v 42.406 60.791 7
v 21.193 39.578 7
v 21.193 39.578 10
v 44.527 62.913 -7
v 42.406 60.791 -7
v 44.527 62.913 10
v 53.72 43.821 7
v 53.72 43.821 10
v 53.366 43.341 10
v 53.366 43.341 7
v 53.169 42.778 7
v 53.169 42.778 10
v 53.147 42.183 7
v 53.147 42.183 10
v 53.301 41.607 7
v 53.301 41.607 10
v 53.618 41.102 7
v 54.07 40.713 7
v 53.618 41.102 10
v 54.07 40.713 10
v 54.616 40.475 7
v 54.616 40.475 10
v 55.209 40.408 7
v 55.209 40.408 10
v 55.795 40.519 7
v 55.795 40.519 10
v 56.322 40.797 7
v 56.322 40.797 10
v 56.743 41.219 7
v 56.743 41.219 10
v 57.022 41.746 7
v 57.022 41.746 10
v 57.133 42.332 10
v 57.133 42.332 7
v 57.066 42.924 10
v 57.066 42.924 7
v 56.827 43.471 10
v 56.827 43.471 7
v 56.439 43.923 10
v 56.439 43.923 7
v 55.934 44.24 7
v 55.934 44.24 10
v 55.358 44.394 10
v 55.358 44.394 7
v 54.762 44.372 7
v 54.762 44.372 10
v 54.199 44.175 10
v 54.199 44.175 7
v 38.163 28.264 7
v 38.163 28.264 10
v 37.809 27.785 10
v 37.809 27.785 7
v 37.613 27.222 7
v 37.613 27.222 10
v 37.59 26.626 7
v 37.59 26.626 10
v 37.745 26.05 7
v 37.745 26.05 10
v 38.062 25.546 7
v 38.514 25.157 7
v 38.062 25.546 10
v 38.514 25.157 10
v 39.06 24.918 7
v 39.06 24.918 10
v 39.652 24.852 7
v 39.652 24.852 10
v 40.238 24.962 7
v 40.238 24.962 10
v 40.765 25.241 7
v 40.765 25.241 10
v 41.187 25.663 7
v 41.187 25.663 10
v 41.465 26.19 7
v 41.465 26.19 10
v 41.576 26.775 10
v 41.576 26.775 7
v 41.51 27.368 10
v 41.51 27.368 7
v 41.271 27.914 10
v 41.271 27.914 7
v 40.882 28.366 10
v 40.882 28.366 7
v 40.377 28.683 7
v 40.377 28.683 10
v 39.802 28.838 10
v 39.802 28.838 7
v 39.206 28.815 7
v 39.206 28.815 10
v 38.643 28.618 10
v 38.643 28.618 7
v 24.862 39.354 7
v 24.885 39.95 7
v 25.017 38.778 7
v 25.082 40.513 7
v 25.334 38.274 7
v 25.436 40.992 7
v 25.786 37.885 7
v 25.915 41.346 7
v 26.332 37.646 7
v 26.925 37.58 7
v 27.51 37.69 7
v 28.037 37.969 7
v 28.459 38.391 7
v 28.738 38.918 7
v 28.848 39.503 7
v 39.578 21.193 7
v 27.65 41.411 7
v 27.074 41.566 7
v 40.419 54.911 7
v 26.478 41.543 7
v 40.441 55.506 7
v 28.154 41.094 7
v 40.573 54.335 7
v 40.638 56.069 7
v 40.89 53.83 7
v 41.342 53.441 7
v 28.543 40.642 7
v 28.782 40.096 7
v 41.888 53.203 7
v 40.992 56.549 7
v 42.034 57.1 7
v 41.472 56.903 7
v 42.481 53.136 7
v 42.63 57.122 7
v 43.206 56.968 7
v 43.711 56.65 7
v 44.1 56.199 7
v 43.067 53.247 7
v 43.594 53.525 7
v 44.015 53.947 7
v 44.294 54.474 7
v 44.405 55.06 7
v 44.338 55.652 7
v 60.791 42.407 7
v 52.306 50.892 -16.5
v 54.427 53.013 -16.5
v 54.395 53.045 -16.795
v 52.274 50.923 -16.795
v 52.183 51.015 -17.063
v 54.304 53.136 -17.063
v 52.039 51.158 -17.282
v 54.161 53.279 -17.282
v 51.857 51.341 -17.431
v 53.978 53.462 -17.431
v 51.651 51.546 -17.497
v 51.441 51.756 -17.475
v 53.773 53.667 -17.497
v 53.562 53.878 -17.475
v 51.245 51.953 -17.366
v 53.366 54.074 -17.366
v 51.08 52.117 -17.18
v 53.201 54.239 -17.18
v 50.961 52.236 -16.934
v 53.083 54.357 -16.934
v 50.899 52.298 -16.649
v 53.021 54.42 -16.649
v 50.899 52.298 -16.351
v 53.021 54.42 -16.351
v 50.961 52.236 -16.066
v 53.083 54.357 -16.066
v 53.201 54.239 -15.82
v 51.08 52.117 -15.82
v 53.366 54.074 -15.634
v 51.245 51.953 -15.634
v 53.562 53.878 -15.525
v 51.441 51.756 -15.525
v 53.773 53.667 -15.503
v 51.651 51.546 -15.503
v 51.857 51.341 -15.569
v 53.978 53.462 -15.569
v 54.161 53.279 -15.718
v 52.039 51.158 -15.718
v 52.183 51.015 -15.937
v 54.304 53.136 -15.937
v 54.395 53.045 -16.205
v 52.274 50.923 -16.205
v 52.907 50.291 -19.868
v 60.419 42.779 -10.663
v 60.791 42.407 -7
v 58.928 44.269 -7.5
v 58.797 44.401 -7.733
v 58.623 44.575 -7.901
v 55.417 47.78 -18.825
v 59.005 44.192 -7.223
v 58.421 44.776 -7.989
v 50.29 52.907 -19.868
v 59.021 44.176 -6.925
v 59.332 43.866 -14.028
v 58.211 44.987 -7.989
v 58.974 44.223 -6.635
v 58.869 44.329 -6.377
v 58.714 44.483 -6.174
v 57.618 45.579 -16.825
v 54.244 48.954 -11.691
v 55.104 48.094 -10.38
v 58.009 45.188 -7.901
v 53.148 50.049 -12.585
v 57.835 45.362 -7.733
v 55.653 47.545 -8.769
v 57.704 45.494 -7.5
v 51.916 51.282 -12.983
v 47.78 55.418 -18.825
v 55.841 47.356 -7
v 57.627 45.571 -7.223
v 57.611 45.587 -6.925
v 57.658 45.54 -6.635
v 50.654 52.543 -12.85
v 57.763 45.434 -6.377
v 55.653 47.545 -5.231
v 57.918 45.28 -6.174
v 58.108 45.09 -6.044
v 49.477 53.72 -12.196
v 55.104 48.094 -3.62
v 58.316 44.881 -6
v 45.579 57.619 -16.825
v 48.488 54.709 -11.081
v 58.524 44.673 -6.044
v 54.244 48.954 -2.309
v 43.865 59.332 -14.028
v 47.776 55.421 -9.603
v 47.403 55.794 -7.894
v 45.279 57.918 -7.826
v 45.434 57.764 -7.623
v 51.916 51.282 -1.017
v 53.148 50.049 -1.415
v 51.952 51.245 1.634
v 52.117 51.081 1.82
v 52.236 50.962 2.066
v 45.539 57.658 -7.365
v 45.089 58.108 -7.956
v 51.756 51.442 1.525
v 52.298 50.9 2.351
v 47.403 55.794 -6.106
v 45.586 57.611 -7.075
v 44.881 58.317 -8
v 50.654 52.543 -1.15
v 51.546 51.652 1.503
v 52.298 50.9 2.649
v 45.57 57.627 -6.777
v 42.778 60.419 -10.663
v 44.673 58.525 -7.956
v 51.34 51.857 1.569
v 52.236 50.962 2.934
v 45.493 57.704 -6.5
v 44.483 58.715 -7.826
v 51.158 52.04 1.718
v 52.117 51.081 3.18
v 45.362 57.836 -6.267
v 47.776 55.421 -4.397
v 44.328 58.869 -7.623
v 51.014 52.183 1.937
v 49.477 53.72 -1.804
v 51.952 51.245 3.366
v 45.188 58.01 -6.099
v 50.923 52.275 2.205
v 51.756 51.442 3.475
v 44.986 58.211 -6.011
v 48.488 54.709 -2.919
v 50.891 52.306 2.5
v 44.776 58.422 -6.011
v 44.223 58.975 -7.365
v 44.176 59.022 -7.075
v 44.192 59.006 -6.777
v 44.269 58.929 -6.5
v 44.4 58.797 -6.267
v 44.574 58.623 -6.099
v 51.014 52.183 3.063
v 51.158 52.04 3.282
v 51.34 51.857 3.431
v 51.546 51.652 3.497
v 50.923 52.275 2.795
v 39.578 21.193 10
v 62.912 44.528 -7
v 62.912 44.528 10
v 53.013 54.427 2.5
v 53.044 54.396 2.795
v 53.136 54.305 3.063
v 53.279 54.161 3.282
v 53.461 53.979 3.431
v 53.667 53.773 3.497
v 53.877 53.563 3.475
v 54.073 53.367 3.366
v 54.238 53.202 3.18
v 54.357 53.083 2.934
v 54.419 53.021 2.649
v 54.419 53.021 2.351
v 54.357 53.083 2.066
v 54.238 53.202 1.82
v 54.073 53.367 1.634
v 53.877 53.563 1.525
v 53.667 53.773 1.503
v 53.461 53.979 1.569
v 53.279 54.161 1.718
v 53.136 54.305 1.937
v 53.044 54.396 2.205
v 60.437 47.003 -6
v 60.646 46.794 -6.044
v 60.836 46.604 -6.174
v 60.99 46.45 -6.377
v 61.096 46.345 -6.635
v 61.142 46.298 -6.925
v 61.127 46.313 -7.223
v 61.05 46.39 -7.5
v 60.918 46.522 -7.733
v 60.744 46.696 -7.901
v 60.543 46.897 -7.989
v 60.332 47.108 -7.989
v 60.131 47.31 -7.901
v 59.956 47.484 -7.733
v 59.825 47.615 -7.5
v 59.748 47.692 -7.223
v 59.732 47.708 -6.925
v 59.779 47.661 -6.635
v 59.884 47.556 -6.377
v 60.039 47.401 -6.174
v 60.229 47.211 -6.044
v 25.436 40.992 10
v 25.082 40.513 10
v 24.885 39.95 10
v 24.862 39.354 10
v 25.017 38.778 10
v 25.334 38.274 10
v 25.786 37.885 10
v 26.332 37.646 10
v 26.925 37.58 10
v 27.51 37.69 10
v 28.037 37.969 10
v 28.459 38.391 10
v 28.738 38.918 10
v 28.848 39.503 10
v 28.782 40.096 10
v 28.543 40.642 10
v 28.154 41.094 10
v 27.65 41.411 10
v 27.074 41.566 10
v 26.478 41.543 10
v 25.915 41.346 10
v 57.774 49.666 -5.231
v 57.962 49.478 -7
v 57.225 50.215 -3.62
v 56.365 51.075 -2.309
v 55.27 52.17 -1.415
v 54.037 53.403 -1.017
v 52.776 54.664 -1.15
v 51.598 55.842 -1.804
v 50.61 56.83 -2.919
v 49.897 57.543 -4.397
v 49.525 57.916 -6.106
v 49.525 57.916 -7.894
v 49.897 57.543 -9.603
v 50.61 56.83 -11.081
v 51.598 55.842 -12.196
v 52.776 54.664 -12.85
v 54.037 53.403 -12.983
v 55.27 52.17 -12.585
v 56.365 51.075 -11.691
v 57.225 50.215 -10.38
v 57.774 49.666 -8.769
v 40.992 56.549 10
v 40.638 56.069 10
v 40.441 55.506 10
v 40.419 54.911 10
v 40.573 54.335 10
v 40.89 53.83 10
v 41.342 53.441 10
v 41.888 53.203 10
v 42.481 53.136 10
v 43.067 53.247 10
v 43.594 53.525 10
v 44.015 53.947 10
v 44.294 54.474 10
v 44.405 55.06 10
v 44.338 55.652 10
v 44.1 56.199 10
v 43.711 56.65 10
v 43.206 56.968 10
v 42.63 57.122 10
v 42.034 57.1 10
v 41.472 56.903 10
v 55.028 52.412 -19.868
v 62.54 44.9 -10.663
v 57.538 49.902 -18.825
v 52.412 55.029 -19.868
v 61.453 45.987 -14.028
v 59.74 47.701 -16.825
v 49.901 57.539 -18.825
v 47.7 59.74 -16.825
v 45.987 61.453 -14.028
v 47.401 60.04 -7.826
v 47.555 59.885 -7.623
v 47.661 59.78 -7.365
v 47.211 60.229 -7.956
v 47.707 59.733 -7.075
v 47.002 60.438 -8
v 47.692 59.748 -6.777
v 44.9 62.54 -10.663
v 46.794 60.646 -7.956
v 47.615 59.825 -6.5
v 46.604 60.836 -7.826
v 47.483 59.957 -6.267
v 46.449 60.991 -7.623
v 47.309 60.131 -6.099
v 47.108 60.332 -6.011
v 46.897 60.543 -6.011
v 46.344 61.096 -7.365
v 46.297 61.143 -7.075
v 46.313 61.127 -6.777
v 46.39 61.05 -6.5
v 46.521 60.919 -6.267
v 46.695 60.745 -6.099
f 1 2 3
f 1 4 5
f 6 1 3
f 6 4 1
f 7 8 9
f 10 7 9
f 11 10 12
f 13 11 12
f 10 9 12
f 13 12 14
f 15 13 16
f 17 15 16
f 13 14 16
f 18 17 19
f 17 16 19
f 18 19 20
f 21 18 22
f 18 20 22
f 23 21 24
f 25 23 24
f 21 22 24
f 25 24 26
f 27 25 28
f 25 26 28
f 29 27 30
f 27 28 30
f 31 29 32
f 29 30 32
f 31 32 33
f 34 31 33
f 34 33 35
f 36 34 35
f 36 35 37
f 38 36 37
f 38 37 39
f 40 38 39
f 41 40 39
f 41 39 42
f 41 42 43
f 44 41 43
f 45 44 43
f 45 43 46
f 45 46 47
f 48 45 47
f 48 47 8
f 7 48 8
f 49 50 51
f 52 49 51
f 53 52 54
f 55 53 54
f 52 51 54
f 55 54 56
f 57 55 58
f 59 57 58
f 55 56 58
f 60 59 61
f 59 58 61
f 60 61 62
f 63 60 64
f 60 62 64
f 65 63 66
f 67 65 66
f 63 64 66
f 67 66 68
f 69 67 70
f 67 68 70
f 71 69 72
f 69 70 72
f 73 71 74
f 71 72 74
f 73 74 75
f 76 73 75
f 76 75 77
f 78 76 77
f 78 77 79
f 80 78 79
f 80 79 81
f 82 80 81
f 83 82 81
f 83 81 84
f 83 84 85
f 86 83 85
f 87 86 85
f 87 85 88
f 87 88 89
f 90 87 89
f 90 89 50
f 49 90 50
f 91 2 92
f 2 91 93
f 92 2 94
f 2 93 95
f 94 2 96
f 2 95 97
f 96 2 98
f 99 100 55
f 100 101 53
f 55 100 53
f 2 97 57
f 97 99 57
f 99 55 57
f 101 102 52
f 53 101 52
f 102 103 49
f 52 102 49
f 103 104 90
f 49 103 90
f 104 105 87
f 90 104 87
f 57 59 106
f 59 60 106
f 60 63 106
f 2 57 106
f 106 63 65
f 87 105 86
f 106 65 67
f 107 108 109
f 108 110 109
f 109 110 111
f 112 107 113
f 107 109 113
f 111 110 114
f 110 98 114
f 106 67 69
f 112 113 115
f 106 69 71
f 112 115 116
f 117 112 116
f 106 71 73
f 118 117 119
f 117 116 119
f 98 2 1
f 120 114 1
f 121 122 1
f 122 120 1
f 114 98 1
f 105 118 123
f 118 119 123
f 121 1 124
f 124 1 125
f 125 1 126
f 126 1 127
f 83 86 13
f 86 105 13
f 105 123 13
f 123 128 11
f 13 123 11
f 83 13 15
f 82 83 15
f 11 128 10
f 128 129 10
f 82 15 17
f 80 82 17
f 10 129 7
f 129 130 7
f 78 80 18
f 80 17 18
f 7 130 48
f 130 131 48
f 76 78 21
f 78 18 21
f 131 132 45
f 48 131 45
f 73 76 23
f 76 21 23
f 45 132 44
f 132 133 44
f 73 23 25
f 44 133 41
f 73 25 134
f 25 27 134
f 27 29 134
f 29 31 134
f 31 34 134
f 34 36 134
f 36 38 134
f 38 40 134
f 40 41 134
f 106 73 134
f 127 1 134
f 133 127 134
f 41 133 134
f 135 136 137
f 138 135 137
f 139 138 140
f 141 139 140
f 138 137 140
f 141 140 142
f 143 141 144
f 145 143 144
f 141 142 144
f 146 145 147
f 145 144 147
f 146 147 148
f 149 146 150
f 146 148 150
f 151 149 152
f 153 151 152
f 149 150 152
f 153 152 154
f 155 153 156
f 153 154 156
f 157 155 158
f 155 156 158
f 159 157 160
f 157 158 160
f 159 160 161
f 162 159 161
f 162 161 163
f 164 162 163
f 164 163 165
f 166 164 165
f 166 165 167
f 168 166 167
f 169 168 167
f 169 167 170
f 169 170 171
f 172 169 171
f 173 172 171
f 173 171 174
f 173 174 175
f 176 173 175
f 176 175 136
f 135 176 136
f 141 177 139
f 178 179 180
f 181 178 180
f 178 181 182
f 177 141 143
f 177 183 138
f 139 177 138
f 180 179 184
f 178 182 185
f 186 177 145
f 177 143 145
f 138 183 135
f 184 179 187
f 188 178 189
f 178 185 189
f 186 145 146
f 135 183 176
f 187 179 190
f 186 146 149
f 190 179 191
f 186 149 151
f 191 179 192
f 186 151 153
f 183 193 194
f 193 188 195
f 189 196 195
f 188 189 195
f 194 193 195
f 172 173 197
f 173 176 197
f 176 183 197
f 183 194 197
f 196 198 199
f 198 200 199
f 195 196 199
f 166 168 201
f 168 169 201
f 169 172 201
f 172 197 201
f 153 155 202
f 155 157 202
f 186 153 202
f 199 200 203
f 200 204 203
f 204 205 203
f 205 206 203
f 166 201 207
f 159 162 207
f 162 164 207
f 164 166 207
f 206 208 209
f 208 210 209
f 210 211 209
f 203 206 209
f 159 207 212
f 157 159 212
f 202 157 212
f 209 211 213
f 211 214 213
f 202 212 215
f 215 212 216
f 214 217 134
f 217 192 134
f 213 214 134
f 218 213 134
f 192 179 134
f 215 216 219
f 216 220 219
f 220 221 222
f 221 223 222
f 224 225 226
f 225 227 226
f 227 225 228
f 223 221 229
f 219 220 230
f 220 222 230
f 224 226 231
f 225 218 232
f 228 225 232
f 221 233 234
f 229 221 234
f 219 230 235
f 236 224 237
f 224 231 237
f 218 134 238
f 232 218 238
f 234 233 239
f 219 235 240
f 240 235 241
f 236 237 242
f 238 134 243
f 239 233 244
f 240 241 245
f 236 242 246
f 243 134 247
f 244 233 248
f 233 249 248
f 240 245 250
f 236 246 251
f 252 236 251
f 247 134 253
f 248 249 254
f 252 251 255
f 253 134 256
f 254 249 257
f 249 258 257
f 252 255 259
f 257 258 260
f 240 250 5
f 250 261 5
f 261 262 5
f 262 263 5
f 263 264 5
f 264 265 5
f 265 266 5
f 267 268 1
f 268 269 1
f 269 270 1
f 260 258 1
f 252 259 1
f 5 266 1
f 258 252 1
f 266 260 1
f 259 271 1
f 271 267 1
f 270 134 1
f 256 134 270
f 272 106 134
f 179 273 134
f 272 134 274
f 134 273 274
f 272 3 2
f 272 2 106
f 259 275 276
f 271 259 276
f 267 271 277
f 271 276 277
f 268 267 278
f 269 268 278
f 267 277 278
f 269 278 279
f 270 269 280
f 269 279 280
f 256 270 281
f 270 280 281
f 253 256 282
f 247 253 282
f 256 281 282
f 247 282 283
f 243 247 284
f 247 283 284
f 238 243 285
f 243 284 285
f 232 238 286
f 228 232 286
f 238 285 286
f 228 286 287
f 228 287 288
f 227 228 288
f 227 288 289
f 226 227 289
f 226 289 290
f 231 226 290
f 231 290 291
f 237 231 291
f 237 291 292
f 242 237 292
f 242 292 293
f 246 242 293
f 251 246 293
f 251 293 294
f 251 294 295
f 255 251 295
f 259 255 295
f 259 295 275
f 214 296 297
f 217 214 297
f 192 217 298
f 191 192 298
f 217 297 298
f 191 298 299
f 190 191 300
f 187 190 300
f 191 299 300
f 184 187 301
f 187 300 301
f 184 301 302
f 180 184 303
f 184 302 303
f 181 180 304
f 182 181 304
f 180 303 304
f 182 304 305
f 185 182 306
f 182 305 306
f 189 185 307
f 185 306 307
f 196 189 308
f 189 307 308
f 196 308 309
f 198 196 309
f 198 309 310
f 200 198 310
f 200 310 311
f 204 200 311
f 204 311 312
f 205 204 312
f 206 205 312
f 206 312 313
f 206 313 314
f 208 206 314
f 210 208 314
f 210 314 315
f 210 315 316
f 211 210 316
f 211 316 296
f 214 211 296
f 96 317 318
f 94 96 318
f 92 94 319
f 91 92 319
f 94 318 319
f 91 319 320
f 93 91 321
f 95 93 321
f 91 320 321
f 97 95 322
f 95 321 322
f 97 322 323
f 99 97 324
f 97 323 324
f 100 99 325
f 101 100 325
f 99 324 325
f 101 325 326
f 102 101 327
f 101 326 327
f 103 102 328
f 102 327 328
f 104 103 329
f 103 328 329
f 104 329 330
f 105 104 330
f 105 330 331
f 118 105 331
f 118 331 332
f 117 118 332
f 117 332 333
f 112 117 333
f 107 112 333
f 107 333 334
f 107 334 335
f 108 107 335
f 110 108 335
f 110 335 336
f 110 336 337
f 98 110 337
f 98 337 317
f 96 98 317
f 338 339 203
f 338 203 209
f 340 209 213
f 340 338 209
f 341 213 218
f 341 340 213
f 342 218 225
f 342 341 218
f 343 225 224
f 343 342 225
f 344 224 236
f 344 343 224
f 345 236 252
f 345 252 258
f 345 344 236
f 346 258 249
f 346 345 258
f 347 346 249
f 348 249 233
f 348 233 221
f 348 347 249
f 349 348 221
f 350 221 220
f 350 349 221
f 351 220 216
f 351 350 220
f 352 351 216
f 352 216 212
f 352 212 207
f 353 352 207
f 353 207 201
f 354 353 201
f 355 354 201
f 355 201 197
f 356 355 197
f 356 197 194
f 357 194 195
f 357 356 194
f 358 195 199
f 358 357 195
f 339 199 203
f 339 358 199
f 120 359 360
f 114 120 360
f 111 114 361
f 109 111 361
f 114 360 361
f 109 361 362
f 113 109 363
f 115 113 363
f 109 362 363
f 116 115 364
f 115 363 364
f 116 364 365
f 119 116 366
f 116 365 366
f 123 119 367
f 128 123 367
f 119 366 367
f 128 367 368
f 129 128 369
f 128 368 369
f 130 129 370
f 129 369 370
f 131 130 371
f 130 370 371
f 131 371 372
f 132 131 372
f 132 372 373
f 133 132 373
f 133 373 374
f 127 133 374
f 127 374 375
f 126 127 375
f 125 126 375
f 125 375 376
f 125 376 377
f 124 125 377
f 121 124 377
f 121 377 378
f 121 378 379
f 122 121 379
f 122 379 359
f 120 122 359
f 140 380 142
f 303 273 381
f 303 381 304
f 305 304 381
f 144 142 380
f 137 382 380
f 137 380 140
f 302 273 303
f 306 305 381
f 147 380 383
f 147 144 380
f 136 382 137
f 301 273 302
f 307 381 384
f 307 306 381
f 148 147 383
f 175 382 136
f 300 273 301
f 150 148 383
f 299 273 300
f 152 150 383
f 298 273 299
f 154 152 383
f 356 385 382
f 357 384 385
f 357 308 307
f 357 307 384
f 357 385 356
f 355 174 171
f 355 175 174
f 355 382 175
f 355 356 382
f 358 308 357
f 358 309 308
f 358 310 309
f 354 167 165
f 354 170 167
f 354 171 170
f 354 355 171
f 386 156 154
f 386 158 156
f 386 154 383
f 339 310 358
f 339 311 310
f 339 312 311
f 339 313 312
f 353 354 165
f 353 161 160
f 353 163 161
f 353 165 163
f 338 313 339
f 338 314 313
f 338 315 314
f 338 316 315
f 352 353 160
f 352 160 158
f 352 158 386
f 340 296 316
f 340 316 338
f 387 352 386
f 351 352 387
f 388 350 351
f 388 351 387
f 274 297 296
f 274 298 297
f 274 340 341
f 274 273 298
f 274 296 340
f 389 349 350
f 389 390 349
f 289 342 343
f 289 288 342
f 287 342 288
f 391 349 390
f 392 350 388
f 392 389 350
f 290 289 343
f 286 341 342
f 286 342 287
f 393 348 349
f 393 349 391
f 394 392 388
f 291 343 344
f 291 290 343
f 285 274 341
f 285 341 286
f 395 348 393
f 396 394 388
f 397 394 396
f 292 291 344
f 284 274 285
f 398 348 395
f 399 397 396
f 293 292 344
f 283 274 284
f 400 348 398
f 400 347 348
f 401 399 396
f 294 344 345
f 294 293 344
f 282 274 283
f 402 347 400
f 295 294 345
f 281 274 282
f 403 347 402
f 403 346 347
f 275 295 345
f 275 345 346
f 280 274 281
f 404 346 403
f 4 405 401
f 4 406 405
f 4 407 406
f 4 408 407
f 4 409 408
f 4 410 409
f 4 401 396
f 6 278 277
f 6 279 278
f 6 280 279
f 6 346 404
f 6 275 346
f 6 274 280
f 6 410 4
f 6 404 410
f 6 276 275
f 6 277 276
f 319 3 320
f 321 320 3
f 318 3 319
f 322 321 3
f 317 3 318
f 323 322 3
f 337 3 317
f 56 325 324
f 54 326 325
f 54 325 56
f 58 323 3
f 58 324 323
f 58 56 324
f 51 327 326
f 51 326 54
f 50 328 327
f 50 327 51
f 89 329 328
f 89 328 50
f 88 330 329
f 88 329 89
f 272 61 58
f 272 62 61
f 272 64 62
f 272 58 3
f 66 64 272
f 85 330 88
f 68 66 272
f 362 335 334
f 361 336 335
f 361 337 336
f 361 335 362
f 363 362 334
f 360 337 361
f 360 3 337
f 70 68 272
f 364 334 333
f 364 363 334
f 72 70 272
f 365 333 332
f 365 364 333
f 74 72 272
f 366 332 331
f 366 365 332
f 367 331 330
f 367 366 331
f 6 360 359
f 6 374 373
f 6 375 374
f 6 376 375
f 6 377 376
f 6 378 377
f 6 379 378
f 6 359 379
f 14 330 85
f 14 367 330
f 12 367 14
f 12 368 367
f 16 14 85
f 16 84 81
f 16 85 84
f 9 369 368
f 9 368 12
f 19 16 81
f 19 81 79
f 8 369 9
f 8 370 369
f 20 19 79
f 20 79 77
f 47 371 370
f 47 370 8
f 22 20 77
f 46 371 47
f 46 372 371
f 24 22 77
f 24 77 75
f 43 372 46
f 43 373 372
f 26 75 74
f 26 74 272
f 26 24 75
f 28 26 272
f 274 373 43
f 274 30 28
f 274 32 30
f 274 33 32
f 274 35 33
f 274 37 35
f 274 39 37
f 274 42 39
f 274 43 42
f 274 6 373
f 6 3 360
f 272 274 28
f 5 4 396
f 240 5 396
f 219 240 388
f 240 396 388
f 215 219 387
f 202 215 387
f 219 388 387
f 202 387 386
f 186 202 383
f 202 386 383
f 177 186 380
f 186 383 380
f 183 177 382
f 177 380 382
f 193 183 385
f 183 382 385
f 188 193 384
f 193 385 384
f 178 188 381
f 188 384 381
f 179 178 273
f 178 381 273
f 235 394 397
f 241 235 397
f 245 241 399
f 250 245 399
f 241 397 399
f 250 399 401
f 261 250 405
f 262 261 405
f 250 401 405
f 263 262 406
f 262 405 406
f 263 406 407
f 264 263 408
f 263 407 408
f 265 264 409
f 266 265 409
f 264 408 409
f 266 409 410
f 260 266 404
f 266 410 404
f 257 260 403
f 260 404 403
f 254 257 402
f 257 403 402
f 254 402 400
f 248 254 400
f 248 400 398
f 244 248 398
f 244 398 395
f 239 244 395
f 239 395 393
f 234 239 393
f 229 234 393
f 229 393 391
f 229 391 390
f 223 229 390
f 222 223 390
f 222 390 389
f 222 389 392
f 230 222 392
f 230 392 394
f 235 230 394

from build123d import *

# Parameters (mm, degrees)
SKETCH088_R             = 6
PAD064_DEPTH            = 3
SKETCH089_W             = 26
SKETCH089_H             = 3
PAD065_DEPTH            = 30
SKETCH090_R             = 2
POCKET032_DEPTH         = 30.001
SKETCH091_R             = 1
POCKET033_DEPTH         = 136.248276
POLARPATTERN013_COUNT   = 4
BODY039_PLACEMENT_ANGLE = 315


with BuildPart() as part:
    # Sketch088 → Pad064 (new body)
    with BuildSketch(Plane.XZ):
        with BuildLine():
            Line((-13, 17), (13, 17))
            Line((13, 17), (13, 0))
            ThreePointArc((-13, 0), (0, -13), (13, 0))
            Line((-13, 17), (-13, 0))
        make_face()
        Circle(SKETCH088_R, mode=Mode.SUBTRACT)
    extrude(amount=PAD064_DEPTH)

    # Sketch089 (on Face7 of Pad064) → Pad065 (join)
    with BuildSketch(Plane.XZ.offset(3)):
        with Locations((0, 15.5)):
            Rectangle(SKETCH089_W, SKETCH089_H)
    extrude(amount=PAD065_DEPTH)

    # Sketch090 (on Face5 of Pad065) → Pocket032 (cut, through all)
    with BuildSketch(Plane(origin=(0, 0, 17), x_dir=(-1, 0, 0), z_dir=(0, 0, 1))):
        with Locations((-9, 7)):
            Circle(SKETCH090_R)
        with Locations((9, 7)):
            Circle(SKETCH090_R)
        with Locations((-9, 29)):
            Circle(SKETCH090_R)
        with Locations((9, 29)):
            Circle(SKETCH090_R)
    extrude(amount=-POCKET032_DEPTH, mode=Mode.SUBTRACT)

    # Sketch091 (on Face4 of Pocket032) → Pocket033 (cut, through all)
    with BuildSketch(Plane(origin=(0, 0, 0), x_dir=(1, 0, 0), z_dir=(0, 1, 0))):
        with Locations((0, 9.5)):
            Circle(SKETCH091_R)
    pocket033 = extrude(amount=-POCKET033_DEPTH, mode=Mode.SUBTRACT)

    # PolarPattern013: Pocket033 ×4 about axis
    polarpattern013_axis = Axis((0, 0, 0), (0, 1, 0))
    for i in range(1, POLARPATTERN013_COUNT):
        add(pocket033.rotate(polarpattern013_axis, i * 360 / POLARPATTERN013_COUNT), mode=Mode.SUBTRACT)


with BuildPart() as part_1:
    # Body039 placement: moved
    add(part.part.moved(Location((53.719799, 53.720316, -7))).rotate(Axis((53.719799, 53.720316, -7), (0, 0, 1)), BODY039_PLACEMENT_ANGLE))


solid = part_1.part
